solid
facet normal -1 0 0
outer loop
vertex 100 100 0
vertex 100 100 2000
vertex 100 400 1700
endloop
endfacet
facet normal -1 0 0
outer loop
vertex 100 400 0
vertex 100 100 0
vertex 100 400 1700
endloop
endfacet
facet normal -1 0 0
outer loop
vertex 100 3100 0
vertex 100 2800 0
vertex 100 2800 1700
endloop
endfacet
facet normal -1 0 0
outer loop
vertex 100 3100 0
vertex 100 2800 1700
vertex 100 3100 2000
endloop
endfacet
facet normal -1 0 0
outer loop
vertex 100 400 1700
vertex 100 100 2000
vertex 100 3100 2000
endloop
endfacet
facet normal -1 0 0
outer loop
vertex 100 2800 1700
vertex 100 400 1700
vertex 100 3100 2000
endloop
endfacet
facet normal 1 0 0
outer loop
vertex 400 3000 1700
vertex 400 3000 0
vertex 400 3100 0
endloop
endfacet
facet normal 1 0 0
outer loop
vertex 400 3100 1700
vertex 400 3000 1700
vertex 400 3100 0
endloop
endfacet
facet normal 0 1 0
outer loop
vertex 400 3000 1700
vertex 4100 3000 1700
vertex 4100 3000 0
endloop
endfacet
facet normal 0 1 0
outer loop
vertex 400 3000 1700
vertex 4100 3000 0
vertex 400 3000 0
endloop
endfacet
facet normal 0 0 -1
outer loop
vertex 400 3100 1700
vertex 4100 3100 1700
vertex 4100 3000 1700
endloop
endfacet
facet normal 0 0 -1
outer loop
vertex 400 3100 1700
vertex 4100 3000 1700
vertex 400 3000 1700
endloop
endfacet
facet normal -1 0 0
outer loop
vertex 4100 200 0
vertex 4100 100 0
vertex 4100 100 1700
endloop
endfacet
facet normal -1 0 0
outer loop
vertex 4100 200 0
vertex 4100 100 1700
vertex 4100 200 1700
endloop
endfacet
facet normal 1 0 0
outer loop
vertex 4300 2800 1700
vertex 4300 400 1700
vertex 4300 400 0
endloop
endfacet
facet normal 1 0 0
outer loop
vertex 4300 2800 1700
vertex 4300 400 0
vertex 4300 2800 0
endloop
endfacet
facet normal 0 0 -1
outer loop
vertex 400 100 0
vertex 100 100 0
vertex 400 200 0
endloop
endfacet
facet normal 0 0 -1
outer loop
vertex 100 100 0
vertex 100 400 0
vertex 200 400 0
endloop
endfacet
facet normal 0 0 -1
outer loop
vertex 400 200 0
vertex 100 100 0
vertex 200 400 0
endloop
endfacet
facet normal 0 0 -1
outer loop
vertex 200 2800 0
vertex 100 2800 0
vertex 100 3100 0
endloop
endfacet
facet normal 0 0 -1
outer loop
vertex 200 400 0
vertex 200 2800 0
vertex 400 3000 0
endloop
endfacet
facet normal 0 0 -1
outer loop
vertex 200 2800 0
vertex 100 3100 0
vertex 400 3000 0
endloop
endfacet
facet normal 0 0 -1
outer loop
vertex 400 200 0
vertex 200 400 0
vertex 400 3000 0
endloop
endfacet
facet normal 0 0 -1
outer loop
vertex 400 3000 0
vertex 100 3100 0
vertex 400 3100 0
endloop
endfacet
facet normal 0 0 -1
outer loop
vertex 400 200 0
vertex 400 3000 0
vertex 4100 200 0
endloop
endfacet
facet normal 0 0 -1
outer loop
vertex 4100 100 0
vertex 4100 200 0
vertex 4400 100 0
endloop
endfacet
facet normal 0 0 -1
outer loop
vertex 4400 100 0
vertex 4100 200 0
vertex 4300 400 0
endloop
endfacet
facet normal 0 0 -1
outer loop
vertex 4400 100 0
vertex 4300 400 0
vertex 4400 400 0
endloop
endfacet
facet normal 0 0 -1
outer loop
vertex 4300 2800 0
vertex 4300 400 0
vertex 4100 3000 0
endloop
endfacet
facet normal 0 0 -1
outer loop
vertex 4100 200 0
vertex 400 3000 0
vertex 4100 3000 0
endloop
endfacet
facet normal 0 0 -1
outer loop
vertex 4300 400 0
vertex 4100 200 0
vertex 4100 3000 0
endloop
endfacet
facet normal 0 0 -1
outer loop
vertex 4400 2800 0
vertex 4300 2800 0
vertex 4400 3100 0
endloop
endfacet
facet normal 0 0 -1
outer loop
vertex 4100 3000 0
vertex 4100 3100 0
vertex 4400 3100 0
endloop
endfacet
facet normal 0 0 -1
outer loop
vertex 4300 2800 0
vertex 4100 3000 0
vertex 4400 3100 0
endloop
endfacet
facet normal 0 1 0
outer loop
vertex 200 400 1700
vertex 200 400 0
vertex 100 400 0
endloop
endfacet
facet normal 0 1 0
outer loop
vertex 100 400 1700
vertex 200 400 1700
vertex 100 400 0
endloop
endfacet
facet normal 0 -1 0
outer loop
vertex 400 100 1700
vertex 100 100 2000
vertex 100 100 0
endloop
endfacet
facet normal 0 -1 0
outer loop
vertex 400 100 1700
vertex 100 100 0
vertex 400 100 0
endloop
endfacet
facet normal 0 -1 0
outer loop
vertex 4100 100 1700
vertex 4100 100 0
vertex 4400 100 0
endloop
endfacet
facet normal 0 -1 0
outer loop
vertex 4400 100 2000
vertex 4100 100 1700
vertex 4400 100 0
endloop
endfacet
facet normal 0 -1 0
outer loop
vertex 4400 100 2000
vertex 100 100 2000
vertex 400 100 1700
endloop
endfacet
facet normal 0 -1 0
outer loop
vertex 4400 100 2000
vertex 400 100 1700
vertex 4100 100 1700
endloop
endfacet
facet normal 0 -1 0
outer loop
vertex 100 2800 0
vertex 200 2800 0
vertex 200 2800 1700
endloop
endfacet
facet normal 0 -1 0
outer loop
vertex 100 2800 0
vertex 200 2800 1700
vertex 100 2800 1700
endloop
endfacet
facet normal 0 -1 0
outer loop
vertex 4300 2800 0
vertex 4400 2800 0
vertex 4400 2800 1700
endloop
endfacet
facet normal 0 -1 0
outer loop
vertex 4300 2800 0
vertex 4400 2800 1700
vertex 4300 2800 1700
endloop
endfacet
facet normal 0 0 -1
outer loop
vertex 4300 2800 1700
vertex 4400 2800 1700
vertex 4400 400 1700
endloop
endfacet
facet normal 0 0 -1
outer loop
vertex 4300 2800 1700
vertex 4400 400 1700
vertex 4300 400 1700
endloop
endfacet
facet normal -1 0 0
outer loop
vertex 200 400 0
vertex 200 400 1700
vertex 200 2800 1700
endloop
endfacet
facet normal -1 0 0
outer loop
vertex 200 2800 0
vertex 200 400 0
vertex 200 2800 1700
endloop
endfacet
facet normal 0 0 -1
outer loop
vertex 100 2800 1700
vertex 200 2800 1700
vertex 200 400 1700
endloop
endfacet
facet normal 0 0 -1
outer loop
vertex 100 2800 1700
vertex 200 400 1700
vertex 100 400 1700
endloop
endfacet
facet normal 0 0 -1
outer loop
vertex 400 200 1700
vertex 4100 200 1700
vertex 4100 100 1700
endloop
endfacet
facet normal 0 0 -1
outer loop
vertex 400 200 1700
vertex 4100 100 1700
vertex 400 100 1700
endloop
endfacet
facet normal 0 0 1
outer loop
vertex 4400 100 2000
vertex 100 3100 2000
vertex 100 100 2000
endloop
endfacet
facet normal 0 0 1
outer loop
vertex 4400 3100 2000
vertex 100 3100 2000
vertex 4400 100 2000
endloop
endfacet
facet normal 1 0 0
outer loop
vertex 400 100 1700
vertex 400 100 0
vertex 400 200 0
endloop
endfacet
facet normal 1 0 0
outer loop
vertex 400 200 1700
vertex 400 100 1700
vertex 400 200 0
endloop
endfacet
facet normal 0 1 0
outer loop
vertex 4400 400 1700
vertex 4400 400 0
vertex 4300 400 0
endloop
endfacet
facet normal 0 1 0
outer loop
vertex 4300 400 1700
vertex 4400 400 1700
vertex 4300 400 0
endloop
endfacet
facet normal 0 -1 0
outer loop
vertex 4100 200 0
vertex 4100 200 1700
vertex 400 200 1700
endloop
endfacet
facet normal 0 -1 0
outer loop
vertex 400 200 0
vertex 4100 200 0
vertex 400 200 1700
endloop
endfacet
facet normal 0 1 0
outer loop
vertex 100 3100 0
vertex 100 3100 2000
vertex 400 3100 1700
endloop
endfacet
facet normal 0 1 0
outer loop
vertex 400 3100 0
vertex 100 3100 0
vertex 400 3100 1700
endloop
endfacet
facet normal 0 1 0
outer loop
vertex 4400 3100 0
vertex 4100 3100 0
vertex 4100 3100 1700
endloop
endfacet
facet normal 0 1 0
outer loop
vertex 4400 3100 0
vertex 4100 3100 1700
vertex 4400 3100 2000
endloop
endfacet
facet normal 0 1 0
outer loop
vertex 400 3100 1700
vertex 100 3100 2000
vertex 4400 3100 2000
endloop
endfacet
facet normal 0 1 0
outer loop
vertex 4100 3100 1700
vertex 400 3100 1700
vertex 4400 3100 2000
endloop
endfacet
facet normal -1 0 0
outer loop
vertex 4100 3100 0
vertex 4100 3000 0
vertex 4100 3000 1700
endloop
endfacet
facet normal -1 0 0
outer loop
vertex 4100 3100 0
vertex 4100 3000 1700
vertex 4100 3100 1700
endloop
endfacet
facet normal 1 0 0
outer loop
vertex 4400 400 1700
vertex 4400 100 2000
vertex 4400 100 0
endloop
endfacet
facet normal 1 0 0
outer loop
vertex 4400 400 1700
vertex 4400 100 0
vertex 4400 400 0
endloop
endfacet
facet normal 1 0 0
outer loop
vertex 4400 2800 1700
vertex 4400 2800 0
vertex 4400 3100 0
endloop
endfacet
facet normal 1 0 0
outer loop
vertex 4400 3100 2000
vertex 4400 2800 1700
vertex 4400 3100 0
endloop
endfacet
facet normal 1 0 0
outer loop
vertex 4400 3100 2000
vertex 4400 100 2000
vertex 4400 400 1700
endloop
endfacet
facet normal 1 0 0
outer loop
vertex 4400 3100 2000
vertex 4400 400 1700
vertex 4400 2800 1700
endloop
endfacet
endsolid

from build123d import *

# Parameters (mm, degrees)
SKETCH1_W               = 4500
SKETCH1_H               = 3200
SKETCH1_W_2             = 4300
SKETCH1_H_2             = 3000
BOSS_EXTRUDE1_DEPTH     = 2000
CUT_EXTRUDE1_DEPTH      = 5819.93461039
CUT_EXTRUDE1_DEPTH_BACK = 5819.93461039
SKETCH2_W               = 3700
SKETCH2_H               = 1700
CUT_EXTRUDE2_DEPTH      = 5873.81874401
CUT_EXTRUDE2_DEPTH_BACK = 5873.81874401
SKETCH3_W               = 1700
SKETCH3_H               = 2400
SKETCH4_W               = 3700
SKETCH4_H               = 200
BOSS_EXTRUDE2_DEPTH     = 1700
SKETCH4_W_2             = 200
SKETCH4_H_2             = 2400
BOSS_EXTRUDE2_2_DEPTH   = 1700
BOSS_EXTRUDE2_3_DEPTH   = 1700
BOSS_EXTRUDE2_4_DEPTH   = 1700
SKETCH5_W               = 4300
SKETCH5_H               = 3000
BOSS_EXTRUDE3_DEPTH     = 2000


with BuildPart() as part:
    # Sketch1 → Boss-Extrude1 (new body)
    with BuildSketch(Plane.XY):
        with Locations((2250, 1600)):
            Rectangle(SKETCH1_W, SKETCH1_H)
        with Locations((2250, 1600)):
            Rectangle(SKETCH1_W_2, SKETCH1_H_2, mode=Mode.SUBTRACT)
    extrude(amount=BOSS_EXTRUDE1_DEPTH)

    # Sketch2 → Cut-Extrude1 (cut, two sides: drawn at the far end of the back side and taken through both)
    with BuildSketch(Plane.XZ.offset(-3100).offset(-CUT_EXTRUDE1_DEPTH_BACK)):
        with Locations((2250, 850)):
            Rectangle(SKETCH2_W, SKETCH2_H)
    extrude(amount=CUT_EXTRUDE1_DEPTH + CUT_EXTRUDE1_DEPTH_BACK, mode=Mode.SUBTRACT)

    # Sketch3 → Cut-Extrude2 (cut, two sides: drawn at the far end of the back side and taken through both)
    with BuildSketch(Plane.ZY.offset(-CUT_EXTRUDE2_DEPTH_BACK)):
        with Locations((850, 1600)):
            Rectangle(SKETCH3_W, SKETCH3_H)
    extrude(amount=CUT_EXTRUDE2_DEPTH + CUT_EXTRUDE2_DEPTH_BACK, mode=Mode.SUBTRACT)


with BuildPart() as body_2:
    # Sketch4 → Boss-Extrude2 (new body)
    with BuildSketch(Plane(origin=(0, 0, 1700), x_dir=(-1, 0, 0), z_dir=(0, 0, -1))):
        with Locations((-2250, 100)):
            Rectangle(SKETCH4_W, SKETCH4_H)
    extrude(amount=BOSS_EXTRUDE2_DEPTH)


with BuildPart() as body_3:
    # Sketch4 → Boss-Extrude2 2 (new body)
    with BuildSketch(Plane(origin=(0, 0, 1700), x_dir=(-1, 0, 0), z_dir=(0, 0, -1))):
        with Locations((-100, 1600)):
            Rectangle(SKETCH4_W_2, SKETCH4_H_2)
    extrude(amount=BOSS_EXTRUDE2_2_DEPTH)


with BuildPart() as body_4:
    # Sketch4 → Boss-Extrude2 3 (new body)
    with BuildSketch(Plane(origin=(0, 0, 1700), x_dir=(-1, 0, 0), z_dir=(0, 0, -1))):
        with Locations((-2250, 3100)):
            Rectangle(SKETCH4_W, SKETCH4_H)
    extrude(amount=BOSS_EXTRUDE2_3_DEPTH)


with BuildPart() as body_5:
    # Sketch4 → Boss-Extrude2 4 (new body)
    with BuildSketch(Plane(origin=(0, 0, 1700), x_dir=(-1, 0, 0), z_dir=(0, 0, -1))):
        with Locations((-4400, 1600)):
            Rectangle(SKETCH4_W_2, SKETCH4_H_2)
    extrude(amount=BOSS_EXTRUDE2_4_DEPTH)


with BuildPart() as body_6:
    # Sketch5 → Boss-Extrude3 (new body)
    with BuildSketch(Plane.XY.offset(2000)):
        with Locations((2250, 1600)):
            Rectangle(SKETCH5_W, SKETCH5_H)
    extrude(amount=-BOSS_EXTRUDE3_DEPTH)

    # Combine1: cut part, body 5, body 4, body 3, body 2
    add(part.part, mode=Mode.SUBTRACT)
    add(body_5.part, mode=Mode.SUBTRACT)
    add(body_4.part, mode=Mode.SUBTRACT)
    add(body_3.part, mode=Mode.SUBTRACT)
    add(body_2.part, mode=Mode.SUBTRACT)


solid = body_6.part
